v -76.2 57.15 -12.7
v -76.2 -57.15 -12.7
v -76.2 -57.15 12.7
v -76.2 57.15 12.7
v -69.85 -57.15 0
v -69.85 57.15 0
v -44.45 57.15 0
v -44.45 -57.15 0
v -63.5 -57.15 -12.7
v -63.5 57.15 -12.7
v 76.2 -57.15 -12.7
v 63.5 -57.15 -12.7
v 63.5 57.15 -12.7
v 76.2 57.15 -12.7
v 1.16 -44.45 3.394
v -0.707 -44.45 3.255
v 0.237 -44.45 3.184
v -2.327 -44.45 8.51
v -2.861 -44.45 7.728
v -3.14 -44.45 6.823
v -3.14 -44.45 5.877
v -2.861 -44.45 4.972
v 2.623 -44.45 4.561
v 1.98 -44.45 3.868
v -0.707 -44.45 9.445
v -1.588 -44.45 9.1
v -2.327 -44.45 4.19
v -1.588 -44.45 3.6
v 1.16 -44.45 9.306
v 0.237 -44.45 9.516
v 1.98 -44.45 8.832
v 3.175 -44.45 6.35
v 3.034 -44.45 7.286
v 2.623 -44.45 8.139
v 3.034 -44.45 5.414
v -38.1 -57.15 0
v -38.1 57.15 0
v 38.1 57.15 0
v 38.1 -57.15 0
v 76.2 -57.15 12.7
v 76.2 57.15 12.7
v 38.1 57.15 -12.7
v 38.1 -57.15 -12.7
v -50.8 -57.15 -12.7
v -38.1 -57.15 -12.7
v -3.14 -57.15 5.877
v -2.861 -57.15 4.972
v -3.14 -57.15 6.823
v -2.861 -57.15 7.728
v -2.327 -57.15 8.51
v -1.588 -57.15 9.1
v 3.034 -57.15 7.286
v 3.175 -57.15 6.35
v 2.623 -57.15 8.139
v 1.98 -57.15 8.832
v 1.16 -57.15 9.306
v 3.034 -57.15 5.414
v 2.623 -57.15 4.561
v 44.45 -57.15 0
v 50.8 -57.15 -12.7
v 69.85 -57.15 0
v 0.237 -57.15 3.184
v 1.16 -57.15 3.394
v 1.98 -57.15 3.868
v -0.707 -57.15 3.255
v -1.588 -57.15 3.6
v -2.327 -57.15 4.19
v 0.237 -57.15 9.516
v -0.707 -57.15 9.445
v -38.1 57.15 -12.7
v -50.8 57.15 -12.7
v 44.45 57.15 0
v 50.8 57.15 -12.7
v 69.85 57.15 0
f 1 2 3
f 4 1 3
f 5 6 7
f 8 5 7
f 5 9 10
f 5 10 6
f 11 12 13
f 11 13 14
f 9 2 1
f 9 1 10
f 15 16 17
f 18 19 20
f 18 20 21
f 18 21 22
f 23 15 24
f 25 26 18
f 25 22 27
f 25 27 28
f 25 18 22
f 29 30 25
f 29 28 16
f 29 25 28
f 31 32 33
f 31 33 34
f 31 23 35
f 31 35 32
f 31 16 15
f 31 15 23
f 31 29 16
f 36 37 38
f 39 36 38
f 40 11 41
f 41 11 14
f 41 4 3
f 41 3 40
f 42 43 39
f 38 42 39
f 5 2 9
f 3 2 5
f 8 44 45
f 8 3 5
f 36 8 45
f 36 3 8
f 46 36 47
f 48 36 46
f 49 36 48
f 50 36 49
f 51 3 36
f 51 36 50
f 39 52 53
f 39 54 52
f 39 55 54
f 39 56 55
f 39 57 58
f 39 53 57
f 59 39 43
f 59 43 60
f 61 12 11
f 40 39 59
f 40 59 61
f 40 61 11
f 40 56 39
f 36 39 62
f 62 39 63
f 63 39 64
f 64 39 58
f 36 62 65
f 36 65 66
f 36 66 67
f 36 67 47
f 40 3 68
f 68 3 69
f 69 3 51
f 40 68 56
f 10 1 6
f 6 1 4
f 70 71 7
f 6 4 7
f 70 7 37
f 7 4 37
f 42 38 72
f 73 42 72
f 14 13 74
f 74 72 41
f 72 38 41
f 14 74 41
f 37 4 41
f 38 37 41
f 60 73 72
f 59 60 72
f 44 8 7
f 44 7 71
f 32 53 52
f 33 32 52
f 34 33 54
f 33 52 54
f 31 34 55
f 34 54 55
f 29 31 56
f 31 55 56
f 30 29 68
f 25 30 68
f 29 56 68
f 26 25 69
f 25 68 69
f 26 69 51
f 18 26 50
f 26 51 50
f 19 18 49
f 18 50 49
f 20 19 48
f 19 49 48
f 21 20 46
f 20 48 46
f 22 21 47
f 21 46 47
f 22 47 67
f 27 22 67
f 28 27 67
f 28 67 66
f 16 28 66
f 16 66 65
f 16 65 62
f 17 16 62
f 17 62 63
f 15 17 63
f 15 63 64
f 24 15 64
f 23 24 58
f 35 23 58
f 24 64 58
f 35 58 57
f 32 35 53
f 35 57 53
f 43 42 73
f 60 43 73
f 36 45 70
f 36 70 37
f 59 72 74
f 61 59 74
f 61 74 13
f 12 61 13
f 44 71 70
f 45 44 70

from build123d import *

# Parameters (mm, degrees)
F0_W     = 152.4
F0_H     = 114.3
F1_DEPTH = 12.7
F2_W     = 6.35
F2_H     = 12.7
F3_DEPTH = 114.3
F4_R     = 3.175
F5_DEPTH = 12.7


with BuildPart() as f1:
    # F0 (on Top) → F1 (new body)
    with BuildSketch(Plane.XY):
        Rectangle(F0_W, F0_H)
    extrude(amount=F1_DEPTH)

    # F2 (on face) → F3 (join)
    with BuildSketch(Plane.XZ.offset(57.15)):
        Polygon((-63.5, -12.7), (-69.85, 0), (-69.85, -12.7), align=None)
        with Locations((-73.025, -6.35)):
            Rectangle(F2_W, F2_H)
        Polygon((-44.45, -12.7), (-44.45, 0), (-50.8, -12.7), align=None)
        with Locations((-41.275, -6.35)):
            Rectangle(F2_W, F2_H)
        with Locations((41.275, -6.35)):
            Rectangle(F2_W, F2_H)
        Polygon((50.8, -12.7), (44.45, 0), (44.45, -12.7), align=None)
        Polygon((69.85, -12.7), (69.85, 0), (63.5, -12.7), align=None)
        with Locations((73.025, -6.35)):
            Rectangle(F2_W, F2_H)
    extrude(amount=-F3_DEPTH)

    # F4 (on face) → F5 (cut)
    with BuildSketch(Plane.XZ.offset(57.15)):
        with Locations((0, 6.35)):
            Circle(F4_R)
    extrude(amount=-F5_DEPTH, mode=Mode.SUBTRACT)


solid = f1.part
